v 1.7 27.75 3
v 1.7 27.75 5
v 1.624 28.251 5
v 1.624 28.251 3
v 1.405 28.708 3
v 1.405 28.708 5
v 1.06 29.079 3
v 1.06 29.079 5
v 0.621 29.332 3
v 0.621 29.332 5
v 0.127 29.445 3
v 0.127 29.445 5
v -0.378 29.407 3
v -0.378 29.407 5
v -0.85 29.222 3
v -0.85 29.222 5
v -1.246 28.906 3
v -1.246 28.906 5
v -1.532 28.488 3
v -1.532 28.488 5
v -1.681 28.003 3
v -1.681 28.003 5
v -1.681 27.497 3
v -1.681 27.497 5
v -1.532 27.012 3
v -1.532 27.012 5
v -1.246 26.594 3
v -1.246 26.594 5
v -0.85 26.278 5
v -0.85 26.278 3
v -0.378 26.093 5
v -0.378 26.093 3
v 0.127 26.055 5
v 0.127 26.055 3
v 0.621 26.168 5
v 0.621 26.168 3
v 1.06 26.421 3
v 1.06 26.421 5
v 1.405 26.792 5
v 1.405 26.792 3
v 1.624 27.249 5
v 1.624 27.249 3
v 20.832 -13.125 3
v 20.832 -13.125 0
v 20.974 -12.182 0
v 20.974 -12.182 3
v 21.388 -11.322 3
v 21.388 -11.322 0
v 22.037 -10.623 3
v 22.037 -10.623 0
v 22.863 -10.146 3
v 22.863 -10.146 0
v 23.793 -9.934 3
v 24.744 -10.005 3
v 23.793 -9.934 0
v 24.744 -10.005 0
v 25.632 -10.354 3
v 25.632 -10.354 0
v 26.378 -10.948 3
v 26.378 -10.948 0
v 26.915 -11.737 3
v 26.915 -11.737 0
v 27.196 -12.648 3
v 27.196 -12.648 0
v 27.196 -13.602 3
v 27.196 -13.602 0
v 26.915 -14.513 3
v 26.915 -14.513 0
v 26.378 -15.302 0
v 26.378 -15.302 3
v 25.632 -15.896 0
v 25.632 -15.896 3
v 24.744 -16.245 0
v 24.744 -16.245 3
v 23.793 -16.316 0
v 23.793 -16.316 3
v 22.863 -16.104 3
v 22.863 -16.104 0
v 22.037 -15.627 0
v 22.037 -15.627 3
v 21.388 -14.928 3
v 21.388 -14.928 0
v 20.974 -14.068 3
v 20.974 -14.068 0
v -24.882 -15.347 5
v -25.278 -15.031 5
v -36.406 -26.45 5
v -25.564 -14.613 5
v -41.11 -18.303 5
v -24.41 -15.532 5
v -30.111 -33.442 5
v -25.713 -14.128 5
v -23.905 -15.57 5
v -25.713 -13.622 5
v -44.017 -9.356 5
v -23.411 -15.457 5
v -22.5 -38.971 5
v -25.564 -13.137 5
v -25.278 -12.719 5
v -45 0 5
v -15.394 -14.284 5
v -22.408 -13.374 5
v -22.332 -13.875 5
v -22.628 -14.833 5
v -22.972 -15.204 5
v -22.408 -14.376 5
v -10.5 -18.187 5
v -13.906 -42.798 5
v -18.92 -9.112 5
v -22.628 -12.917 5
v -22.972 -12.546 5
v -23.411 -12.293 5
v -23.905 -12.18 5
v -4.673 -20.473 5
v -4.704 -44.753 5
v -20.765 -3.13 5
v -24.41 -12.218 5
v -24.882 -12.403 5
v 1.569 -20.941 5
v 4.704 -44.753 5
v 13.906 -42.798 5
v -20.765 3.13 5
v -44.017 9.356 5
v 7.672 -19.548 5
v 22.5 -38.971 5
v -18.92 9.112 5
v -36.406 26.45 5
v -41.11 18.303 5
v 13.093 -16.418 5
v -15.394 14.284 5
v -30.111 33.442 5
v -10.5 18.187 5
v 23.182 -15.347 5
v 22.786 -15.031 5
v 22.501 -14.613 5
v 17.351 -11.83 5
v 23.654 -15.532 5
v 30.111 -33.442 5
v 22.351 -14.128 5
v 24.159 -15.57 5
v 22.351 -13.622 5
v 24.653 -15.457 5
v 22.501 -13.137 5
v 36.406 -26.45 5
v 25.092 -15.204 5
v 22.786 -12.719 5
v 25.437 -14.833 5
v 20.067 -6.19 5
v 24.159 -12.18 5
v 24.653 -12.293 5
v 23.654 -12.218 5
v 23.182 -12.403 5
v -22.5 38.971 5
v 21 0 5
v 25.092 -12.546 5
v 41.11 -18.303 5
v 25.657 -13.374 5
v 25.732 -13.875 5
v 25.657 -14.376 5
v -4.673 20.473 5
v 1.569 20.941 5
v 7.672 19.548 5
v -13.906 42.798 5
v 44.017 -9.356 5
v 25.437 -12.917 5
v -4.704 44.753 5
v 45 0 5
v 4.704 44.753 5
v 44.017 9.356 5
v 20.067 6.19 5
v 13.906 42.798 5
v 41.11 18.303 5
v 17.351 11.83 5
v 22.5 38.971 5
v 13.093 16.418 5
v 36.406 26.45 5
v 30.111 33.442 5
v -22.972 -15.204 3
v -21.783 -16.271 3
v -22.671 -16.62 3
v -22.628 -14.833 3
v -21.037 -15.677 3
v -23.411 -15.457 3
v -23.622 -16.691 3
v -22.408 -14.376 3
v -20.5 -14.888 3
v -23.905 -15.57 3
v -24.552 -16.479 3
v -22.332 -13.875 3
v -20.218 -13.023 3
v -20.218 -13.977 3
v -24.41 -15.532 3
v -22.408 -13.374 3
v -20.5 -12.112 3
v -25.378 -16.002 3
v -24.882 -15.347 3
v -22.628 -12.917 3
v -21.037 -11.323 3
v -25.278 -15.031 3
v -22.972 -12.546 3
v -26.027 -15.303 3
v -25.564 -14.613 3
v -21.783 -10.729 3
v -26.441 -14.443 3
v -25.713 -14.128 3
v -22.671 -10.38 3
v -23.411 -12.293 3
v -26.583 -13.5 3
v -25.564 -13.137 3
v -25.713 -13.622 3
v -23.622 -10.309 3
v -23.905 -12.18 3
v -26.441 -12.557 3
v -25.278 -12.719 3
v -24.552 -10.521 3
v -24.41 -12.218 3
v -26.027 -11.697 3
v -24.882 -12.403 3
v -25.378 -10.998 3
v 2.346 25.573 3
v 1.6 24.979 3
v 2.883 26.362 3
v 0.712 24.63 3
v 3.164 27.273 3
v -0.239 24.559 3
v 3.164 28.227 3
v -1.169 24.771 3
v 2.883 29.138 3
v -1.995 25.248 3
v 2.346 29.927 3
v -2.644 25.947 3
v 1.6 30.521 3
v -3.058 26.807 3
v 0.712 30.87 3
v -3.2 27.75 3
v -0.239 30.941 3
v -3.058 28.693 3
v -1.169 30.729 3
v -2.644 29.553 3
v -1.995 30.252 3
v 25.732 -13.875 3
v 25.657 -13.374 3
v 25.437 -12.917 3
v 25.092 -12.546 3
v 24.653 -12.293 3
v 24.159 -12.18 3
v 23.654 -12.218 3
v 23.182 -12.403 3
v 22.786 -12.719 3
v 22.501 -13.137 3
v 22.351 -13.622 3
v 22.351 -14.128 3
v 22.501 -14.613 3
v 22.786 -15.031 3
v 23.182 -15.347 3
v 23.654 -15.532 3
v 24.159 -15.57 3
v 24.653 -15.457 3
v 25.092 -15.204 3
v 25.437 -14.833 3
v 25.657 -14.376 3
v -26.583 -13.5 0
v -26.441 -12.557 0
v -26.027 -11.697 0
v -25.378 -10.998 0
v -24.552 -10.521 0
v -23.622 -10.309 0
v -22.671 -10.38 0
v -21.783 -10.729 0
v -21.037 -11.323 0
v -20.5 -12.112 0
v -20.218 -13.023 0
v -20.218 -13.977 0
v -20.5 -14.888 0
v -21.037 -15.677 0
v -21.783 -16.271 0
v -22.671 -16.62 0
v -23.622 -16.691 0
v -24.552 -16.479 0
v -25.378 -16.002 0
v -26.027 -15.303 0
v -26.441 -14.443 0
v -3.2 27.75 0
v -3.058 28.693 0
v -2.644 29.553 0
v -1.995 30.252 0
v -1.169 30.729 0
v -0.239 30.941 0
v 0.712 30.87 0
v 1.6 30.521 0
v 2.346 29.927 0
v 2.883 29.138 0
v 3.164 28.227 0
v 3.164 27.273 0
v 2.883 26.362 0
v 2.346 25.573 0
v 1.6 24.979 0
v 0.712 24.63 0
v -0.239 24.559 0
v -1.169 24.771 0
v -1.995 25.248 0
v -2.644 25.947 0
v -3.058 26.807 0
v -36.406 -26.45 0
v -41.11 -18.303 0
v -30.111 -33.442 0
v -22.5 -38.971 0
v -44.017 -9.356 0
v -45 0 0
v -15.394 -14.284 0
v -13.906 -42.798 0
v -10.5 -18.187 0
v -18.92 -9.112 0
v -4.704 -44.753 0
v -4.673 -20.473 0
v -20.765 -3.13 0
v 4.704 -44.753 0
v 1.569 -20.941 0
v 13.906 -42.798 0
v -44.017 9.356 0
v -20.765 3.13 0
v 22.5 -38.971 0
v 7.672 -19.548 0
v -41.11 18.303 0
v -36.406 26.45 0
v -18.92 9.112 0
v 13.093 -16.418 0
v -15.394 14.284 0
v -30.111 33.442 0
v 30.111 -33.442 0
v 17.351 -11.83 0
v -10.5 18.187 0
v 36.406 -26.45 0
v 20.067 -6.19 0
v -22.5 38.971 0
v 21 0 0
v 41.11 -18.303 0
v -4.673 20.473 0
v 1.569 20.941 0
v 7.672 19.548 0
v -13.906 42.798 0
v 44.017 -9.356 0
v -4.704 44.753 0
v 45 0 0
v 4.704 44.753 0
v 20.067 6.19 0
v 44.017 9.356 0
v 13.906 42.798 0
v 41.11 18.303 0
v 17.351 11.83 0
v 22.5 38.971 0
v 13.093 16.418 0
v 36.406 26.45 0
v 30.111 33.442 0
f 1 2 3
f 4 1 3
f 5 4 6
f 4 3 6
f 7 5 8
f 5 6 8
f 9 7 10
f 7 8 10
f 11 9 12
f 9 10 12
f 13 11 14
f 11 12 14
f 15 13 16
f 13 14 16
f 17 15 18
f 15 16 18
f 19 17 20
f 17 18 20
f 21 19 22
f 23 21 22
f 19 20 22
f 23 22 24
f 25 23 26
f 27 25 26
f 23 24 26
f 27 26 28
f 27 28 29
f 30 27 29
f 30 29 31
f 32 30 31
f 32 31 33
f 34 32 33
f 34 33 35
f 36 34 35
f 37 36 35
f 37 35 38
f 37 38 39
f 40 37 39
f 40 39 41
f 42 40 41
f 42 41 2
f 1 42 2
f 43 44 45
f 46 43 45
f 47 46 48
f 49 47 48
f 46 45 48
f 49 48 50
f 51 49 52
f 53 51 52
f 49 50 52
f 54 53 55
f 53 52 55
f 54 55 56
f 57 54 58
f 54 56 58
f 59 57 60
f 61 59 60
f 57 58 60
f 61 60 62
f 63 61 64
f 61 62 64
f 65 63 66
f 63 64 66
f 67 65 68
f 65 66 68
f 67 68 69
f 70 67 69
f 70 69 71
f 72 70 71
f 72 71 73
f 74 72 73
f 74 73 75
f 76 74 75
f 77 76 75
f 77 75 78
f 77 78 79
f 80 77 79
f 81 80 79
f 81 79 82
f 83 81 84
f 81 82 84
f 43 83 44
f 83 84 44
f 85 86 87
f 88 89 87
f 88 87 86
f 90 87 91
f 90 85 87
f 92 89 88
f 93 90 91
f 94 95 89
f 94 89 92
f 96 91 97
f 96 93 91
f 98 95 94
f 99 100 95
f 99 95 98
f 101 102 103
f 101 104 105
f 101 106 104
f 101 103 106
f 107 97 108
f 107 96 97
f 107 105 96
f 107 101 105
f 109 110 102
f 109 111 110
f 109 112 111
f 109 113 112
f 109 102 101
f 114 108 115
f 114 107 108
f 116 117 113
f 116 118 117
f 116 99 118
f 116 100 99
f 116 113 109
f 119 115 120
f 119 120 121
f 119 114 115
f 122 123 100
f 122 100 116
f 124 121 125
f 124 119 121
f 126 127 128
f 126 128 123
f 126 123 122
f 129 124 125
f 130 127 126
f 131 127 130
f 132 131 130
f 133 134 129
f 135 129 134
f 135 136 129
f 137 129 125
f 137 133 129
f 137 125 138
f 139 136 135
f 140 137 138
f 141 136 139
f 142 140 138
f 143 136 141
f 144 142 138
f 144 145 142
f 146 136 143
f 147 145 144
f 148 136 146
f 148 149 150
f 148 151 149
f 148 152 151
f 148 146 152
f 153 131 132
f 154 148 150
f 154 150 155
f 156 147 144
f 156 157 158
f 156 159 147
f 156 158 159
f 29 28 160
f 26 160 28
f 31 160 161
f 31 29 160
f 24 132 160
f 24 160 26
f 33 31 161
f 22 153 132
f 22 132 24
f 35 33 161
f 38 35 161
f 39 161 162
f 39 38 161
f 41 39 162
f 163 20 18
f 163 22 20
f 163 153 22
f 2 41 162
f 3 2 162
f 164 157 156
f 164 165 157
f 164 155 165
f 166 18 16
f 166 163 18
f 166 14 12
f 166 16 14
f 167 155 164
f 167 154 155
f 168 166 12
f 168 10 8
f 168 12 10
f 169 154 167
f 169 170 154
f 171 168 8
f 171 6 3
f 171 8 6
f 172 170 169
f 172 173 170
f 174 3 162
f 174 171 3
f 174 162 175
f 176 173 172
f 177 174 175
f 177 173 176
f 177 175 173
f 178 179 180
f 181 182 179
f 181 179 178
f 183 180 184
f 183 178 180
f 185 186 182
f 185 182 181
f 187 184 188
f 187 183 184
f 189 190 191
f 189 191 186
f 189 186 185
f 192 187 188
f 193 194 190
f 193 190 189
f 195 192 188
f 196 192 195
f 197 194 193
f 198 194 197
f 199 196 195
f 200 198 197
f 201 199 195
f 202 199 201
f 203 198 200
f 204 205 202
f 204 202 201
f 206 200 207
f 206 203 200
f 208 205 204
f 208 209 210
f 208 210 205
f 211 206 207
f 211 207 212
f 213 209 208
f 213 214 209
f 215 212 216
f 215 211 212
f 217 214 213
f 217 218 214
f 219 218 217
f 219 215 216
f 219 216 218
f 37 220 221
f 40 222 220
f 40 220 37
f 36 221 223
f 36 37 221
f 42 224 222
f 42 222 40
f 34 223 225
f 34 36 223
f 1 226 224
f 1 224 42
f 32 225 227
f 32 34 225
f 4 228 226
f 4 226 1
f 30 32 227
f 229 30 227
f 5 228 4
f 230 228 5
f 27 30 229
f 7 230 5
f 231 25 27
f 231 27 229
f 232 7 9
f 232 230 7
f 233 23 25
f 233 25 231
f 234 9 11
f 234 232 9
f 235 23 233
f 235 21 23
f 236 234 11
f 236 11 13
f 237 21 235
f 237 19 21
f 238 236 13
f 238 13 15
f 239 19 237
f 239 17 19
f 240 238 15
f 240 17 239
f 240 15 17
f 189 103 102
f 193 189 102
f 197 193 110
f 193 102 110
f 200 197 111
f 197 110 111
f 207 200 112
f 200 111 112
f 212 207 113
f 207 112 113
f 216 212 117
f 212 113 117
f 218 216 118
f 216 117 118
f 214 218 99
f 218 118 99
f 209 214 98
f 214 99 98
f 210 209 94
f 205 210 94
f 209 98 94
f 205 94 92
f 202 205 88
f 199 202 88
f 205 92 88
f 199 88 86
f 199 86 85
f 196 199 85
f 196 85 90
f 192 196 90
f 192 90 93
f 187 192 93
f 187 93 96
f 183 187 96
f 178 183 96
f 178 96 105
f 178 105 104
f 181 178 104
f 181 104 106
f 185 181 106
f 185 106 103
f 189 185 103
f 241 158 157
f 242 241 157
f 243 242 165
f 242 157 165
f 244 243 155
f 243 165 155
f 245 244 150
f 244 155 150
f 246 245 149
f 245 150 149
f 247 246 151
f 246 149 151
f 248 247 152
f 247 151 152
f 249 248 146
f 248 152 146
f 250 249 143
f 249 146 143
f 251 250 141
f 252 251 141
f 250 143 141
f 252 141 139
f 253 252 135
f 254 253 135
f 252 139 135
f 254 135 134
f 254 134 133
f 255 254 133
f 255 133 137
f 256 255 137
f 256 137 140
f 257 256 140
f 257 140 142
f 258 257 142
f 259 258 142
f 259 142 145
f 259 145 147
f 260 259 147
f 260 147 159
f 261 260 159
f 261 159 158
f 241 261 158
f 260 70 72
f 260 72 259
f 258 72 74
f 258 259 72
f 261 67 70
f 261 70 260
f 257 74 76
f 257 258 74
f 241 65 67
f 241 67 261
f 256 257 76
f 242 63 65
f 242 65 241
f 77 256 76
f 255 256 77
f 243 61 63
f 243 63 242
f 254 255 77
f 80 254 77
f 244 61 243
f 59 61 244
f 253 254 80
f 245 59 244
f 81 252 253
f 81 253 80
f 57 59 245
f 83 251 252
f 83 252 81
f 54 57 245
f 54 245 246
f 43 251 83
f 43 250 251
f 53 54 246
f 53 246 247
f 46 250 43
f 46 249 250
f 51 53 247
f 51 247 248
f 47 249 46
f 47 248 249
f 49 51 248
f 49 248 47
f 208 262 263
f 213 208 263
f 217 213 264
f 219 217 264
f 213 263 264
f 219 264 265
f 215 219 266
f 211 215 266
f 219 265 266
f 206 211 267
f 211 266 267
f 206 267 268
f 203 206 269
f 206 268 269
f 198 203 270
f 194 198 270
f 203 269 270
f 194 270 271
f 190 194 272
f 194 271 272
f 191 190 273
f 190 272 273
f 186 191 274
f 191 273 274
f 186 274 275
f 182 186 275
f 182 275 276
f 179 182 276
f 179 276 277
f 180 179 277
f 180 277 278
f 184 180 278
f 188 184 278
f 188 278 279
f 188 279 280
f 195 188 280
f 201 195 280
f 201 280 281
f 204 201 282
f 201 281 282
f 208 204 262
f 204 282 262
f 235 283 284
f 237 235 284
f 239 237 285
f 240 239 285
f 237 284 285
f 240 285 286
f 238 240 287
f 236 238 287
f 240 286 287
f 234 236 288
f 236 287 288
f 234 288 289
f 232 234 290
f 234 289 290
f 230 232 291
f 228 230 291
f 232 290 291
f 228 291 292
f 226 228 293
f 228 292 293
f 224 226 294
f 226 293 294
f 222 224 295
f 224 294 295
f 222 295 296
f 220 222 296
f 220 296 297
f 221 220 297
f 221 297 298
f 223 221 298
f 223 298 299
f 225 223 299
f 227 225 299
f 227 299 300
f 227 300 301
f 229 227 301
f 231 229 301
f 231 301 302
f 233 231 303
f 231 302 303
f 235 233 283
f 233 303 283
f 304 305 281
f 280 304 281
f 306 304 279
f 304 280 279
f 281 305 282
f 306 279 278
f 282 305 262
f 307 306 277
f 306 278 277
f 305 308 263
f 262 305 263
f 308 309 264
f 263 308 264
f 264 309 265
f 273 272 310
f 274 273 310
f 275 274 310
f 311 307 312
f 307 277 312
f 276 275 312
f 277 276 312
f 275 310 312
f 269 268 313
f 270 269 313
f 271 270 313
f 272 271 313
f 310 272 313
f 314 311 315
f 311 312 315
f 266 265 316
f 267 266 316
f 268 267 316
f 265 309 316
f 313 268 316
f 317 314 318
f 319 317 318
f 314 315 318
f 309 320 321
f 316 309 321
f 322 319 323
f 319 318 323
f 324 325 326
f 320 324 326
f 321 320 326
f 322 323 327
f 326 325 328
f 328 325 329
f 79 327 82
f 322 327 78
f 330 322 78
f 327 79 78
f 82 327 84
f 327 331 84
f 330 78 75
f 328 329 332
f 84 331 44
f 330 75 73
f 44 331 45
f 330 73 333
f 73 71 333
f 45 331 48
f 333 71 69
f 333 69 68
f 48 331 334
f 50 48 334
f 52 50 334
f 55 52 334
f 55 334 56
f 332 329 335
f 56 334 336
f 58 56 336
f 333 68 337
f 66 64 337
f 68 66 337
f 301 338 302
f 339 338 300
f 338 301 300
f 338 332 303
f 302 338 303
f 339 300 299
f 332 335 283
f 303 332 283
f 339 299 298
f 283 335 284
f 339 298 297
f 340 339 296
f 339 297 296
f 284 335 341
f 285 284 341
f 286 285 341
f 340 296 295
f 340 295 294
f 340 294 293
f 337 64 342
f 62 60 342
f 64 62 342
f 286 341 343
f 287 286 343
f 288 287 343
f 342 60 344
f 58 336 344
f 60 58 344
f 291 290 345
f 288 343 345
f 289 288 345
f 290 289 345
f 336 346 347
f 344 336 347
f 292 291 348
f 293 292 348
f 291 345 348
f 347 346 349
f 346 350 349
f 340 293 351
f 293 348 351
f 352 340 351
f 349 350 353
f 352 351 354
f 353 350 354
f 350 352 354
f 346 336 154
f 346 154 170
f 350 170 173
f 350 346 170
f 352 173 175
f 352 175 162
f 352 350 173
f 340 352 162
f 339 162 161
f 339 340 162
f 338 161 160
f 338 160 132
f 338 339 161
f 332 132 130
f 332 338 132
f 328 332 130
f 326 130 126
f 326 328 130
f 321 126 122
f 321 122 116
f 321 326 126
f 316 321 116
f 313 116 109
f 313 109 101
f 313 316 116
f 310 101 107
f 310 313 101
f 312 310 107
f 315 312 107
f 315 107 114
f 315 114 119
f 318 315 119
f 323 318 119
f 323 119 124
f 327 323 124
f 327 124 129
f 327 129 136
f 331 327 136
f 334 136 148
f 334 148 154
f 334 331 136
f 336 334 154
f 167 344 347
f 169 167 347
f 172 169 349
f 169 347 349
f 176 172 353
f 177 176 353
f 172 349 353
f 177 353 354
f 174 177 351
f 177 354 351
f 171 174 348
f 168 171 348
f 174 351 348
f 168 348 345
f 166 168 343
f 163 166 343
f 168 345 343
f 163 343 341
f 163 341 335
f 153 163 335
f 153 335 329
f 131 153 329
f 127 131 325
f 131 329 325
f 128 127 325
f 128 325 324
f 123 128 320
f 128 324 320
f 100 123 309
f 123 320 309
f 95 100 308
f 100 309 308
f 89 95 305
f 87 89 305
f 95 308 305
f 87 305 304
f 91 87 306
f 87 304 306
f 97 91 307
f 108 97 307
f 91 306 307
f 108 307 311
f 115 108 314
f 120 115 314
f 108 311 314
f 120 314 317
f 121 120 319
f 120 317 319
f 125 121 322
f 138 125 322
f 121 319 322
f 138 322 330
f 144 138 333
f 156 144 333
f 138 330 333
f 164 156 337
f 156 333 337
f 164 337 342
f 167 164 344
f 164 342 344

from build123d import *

# Parameters (mm, degrees)
CROQUIS1_R                   = 45
CROQUIS1_R_2                 = 21
SALIENTE_EXTRUIR1_DEPTH      = 5
TALADRO_DE_MARGEN_PARA_M31_D = 3.4
CROQUIS4_R                   = 3.2
CORTAR_EXTRUIR1_DEPTH        = 3


with BuildPart() as part:
    # Croquis1 → Saliente-Extruir1 (new body)
    with BuildSketch(Plane.XY):
        Circle(CROQUIS1_R)
        Circle(CROQUIS1_R_2, mode=Mode.SUBTRACT)
    extrude(amount=SALIENTE_EXTRUIR1_DEPTH)

    # Taladro de margen para M31 (through all)
    with Locations(Plane(origin=(0, 0, 0), x_dir=(-1, 0, 0), z_dir=(0, 0, -1))):
        with Locations((0, 27.75), (24.032204955, -13.875), (-24.032204955, -13.875)):
            Hole(TALADRO_DE_MARGEN_PARA_M31_D / 2)

    # Croquis4 → Cortar-Extruir1 (cut)
    with BuildSketch(Plane(origin=(0, 0, 0), x_dir=(-1, 0, 0), z_dir=(0, 0, -1))):
        with Locations((0, 27.75)):
            Circle(CROQUIS4_R)
        with Locations((23.382685902, -13.5)):
            Circle(CROQUIS4_R)
        with Locations((-24.032204955, -13.125)):
            Circle(CROQUIS4_R)
    extrude(amount=-CORTAR_EXTRUIR1_DEPTH, mode=Mode.SUBTRACT)


solid = part.part
